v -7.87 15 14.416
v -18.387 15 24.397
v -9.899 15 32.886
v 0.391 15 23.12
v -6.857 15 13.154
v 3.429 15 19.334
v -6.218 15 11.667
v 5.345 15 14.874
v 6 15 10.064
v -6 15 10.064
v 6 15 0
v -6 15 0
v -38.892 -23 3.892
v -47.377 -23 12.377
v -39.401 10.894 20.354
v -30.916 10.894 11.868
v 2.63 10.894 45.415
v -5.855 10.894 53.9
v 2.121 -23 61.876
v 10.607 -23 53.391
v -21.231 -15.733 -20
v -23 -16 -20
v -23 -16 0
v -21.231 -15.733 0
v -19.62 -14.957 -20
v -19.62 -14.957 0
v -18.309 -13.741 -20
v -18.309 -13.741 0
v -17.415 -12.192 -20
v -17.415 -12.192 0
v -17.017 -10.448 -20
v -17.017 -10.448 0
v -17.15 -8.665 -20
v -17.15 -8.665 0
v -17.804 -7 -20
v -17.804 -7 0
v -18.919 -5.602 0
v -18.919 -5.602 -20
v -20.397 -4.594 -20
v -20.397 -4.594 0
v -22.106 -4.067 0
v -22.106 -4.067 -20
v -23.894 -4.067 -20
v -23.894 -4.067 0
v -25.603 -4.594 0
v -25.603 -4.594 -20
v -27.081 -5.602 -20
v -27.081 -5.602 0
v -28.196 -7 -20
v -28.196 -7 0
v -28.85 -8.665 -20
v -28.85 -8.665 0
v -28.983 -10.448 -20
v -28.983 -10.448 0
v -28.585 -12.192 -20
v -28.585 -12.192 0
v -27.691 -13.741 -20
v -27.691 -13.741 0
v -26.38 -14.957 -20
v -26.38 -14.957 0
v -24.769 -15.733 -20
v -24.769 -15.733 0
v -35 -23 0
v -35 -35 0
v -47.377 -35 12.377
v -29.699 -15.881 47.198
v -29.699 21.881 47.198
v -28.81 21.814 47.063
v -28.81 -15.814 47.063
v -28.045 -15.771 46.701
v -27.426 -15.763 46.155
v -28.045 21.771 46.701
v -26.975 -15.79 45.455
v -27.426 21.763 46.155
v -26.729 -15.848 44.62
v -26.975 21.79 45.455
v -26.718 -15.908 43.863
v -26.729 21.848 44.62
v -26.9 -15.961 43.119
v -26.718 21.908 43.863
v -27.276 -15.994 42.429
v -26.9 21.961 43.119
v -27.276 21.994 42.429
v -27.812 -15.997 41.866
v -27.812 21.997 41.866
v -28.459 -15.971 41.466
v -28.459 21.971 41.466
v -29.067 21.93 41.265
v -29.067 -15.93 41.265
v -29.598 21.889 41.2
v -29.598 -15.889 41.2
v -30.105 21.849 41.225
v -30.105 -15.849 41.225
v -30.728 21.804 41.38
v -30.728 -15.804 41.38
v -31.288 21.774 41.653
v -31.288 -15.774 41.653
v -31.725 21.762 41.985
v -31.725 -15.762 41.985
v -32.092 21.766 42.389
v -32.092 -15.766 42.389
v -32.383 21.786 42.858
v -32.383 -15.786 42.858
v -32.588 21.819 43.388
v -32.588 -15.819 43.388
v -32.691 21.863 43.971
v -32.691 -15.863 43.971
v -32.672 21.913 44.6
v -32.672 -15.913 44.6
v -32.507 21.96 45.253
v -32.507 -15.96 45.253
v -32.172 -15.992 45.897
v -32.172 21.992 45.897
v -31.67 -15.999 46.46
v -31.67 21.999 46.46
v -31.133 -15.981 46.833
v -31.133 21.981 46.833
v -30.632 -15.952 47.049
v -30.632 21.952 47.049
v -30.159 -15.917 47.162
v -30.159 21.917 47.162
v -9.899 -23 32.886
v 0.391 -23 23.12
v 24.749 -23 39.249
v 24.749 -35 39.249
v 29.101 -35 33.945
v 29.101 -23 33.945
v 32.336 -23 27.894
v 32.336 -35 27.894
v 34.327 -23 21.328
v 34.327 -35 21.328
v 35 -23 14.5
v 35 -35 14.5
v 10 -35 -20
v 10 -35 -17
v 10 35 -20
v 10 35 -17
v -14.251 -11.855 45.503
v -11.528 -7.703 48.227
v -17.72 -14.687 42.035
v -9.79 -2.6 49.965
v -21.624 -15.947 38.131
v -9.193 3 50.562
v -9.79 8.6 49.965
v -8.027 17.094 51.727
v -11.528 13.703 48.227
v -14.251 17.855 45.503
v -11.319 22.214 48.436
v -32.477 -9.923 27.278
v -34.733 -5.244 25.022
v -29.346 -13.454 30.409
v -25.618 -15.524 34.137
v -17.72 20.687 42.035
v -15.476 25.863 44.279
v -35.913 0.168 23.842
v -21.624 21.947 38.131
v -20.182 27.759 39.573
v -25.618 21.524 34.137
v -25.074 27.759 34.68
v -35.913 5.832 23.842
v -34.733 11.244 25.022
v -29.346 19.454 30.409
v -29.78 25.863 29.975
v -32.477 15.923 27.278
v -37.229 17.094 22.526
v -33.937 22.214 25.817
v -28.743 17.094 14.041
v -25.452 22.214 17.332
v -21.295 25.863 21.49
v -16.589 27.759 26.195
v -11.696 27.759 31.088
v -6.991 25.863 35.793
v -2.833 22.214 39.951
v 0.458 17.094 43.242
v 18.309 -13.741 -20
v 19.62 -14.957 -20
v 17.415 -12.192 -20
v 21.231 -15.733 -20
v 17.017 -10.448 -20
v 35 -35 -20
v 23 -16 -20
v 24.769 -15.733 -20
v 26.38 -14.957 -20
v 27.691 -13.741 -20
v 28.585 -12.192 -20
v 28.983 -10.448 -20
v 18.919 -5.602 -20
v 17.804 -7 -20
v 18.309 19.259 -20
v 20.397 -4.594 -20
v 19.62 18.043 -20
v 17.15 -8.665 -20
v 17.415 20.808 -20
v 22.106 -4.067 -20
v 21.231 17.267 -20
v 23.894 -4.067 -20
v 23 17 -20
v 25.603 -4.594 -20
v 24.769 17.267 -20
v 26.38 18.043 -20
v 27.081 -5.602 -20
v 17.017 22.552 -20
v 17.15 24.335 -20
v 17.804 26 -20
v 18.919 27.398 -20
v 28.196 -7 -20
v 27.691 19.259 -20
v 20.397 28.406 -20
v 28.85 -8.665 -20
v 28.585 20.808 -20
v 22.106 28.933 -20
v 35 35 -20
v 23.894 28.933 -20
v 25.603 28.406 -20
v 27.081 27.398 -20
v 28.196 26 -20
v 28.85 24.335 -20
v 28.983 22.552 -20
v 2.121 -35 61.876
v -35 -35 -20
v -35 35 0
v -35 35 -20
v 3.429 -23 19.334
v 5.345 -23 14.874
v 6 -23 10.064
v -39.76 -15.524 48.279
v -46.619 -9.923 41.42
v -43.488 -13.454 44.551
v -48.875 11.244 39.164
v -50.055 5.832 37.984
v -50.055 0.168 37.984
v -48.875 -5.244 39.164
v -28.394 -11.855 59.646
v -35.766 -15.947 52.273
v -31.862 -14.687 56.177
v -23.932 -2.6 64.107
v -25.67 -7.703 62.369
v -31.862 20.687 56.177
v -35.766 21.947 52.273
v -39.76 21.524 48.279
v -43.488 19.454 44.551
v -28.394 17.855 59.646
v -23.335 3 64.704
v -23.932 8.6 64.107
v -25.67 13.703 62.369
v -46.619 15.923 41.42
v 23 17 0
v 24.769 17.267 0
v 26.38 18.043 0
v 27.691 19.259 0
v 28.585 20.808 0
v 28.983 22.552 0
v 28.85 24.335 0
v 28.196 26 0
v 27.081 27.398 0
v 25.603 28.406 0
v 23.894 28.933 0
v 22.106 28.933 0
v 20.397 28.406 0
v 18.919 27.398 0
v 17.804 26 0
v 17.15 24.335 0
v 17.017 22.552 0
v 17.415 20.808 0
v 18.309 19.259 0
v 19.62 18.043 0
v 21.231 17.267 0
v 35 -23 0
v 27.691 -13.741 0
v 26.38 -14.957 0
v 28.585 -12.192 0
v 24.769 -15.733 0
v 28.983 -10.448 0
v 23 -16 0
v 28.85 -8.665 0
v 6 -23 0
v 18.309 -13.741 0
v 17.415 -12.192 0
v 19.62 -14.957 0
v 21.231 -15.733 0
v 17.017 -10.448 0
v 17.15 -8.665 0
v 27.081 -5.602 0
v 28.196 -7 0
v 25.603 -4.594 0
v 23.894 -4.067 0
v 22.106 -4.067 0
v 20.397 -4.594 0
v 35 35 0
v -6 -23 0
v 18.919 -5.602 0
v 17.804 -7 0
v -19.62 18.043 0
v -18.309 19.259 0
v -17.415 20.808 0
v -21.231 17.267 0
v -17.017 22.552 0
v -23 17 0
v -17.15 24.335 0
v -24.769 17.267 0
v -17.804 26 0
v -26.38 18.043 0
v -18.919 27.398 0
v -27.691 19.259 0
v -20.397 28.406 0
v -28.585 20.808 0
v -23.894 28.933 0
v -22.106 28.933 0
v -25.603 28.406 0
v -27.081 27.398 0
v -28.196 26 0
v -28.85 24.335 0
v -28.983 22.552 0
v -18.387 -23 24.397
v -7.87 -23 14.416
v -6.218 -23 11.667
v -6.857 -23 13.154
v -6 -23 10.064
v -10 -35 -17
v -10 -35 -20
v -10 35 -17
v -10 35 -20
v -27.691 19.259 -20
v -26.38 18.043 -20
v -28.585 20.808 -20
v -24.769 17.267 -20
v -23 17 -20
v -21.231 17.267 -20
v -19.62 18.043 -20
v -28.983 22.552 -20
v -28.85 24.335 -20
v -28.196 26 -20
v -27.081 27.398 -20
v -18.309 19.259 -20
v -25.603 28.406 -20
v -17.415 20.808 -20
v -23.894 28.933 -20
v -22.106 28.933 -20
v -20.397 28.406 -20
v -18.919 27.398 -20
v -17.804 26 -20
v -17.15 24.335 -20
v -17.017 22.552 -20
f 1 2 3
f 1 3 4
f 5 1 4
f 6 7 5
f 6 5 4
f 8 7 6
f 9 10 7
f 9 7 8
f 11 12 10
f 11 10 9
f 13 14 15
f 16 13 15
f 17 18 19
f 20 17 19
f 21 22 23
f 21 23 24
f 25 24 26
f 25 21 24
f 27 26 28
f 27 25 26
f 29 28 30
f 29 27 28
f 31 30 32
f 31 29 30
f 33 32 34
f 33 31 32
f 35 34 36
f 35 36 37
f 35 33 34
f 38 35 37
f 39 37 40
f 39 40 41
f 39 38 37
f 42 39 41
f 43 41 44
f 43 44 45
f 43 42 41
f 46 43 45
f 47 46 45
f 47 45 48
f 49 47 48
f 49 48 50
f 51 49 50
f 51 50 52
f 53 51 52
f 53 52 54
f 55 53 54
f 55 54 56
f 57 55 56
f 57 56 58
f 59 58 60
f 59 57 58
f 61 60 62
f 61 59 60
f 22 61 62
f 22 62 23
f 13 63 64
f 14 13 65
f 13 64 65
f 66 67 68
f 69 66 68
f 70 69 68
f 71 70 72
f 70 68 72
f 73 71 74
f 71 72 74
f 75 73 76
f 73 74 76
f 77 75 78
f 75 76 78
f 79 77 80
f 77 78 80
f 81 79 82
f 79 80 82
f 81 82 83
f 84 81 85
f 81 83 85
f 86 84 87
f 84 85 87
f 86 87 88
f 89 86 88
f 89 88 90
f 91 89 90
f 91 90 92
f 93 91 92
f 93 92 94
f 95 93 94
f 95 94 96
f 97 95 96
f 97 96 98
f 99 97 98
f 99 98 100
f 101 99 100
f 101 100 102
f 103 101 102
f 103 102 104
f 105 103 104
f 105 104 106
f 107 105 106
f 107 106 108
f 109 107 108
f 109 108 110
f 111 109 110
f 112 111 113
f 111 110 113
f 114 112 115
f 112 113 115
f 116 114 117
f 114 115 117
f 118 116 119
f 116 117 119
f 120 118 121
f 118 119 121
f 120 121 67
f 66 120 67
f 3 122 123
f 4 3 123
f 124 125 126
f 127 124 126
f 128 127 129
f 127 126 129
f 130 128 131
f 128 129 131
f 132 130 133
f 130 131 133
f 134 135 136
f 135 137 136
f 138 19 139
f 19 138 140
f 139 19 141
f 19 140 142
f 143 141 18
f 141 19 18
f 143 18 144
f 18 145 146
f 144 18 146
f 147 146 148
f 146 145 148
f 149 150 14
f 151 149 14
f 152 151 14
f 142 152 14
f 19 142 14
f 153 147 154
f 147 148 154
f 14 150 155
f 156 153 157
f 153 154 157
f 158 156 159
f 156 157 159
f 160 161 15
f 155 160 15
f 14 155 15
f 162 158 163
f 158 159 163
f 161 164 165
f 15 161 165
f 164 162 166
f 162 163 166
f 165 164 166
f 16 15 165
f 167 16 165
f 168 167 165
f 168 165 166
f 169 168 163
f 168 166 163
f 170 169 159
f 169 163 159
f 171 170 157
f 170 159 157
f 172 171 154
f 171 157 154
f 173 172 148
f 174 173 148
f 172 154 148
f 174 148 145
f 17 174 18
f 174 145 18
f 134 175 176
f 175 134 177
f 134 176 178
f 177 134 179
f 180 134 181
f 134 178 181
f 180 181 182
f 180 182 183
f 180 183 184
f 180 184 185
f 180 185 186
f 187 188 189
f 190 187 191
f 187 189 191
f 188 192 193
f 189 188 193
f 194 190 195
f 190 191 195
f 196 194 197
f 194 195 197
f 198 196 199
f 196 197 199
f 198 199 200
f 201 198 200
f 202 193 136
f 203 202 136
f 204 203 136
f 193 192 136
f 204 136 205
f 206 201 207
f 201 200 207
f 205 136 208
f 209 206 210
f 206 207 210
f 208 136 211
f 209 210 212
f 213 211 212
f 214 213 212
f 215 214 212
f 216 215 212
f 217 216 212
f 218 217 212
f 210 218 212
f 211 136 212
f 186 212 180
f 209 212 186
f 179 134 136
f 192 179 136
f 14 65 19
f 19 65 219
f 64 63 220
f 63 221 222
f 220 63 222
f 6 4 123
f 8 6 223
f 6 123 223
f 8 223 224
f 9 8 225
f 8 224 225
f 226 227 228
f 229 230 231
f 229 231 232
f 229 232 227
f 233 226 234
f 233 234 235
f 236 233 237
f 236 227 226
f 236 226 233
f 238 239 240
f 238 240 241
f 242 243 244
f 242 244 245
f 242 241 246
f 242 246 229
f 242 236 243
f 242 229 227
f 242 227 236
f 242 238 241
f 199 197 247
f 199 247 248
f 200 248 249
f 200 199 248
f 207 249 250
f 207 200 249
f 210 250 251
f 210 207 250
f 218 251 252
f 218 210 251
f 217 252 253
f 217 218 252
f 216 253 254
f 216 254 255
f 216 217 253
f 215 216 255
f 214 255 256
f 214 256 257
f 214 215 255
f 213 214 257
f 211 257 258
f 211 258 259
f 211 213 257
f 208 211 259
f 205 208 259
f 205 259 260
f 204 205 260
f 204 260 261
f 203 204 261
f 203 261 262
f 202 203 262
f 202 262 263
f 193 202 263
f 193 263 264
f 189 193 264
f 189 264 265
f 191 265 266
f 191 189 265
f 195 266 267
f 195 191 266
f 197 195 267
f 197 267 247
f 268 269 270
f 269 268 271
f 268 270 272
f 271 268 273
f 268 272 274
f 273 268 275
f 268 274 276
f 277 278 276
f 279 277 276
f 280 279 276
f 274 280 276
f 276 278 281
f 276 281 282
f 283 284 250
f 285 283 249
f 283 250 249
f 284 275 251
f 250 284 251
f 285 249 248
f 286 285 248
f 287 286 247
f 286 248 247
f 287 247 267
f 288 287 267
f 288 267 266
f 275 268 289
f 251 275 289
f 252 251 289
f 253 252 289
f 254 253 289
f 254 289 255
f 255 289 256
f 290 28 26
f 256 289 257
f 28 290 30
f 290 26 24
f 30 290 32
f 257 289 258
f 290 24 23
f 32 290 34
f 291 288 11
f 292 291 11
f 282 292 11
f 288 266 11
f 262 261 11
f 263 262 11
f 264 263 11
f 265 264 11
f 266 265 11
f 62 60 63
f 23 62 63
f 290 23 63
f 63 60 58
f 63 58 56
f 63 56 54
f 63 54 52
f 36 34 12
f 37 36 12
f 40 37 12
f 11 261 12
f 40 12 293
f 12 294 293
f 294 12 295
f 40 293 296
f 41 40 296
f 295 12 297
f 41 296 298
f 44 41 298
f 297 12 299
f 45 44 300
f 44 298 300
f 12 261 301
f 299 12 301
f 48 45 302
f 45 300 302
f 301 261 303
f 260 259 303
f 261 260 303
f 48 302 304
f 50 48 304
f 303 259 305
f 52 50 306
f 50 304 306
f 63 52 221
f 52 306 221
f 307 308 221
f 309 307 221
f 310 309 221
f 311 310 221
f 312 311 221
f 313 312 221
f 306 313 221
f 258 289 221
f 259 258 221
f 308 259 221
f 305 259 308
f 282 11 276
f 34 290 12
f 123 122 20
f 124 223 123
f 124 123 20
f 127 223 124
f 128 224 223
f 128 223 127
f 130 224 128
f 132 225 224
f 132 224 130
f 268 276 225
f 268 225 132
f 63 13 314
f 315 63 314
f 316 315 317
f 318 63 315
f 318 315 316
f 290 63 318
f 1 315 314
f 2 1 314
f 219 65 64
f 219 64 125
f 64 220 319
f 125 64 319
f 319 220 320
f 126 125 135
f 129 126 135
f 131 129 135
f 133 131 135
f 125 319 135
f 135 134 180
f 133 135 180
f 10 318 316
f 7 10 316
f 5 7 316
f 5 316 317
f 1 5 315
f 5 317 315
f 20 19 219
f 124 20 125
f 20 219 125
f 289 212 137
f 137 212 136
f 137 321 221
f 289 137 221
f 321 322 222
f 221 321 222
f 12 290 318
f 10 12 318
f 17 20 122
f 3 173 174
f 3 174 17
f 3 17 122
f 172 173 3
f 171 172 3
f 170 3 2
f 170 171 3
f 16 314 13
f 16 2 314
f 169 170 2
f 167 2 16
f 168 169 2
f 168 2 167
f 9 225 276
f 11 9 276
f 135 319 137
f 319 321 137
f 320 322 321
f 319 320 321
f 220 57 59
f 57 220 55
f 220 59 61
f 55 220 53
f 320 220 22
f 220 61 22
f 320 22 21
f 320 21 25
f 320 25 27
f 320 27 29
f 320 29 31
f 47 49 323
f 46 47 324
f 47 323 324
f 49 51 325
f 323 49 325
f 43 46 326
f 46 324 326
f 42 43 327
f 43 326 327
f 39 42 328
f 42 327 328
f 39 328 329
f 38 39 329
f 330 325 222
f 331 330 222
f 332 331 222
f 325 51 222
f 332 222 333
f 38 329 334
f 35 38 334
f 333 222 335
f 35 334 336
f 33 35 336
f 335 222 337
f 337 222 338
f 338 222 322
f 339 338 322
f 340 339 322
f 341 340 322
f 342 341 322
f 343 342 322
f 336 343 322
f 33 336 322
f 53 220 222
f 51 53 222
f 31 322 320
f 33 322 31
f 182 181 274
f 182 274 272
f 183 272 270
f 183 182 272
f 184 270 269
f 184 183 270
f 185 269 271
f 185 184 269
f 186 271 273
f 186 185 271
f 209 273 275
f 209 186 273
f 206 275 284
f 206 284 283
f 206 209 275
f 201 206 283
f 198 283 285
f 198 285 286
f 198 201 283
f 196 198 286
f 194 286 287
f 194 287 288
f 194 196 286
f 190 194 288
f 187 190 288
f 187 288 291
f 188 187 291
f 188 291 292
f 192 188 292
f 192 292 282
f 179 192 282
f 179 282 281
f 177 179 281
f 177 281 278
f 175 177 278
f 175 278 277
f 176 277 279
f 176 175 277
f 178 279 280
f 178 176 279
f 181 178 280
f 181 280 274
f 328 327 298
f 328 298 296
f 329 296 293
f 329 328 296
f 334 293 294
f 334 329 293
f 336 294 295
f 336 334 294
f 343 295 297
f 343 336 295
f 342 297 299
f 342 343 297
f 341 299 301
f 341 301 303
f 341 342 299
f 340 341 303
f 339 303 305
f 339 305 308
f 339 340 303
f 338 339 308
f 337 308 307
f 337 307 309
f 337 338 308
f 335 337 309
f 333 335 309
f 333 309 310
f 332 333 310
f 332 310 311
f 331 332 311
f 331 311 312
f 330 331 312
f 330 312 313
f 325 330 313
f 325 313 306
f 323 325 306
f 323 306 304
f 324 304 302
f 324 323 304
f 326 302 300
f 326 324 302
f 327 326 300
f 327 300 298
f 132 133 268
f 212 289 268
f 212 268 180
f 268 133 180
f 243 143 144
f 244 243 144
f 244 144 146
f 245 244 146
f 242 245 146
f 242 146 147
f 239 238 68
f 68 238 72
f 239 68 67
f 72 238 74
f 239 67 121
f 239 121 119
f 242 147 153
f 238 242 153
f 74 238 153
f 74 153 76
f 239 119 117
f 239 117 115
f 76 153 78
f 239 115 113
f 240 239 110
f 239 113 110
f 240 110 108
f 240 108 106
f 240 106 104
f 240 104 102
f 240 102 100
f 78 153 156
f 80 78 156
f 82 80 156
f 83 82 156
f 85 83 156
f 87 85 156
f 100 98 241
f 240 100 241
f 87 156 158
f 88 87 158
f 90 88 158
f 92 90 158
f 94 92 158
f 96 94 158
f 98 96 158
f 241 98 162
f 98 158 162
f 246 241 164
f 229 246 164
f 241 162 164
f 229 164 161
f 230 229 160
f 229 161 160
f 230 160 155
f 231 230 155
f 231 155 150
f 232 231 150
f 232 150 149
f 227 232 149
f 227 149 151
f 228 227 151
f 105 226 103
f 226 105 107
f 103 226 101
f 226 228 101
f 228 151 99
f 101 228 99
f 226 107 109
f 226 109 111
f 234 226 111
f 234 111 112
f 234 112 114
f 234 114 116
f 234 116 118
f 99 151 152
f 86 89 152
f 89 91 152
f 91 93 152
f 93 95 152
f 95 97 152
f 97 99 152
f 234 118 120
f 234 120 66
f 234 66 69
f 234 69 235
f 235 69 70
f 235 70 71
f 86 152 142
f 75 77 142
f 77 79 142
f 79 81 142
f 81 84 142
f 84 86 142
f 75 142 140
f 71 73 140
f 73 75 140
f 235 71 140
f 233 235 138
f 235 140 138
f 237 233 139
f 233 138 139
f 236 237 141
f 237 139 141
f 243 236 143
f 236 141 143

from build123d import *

# Parameters (mm, degrees)
BOSS_EXTRUDE1_DEPTH       = 35
BOSS_EXTRUDE2_DEPTH       = 12
BOSS_EXTRUDE3_DEPTH       = 12
SKETCH4_R                 = 19
BOSS_EXTRUDE4_DEPTH       = 20
BOSS_EXTRUDE5_DEPTH       = 38
SKETCH7_W                 = 6
SKETCH7_H                 = 100
LPATTERN1_COUNT           = 2
LPATTERN1_PITCH           = 33
LPATTERN2_COUNT           = 2
LPATTERN2_PITCH           = 46
LPATTERN2_COPY_1_SKETCH_W = 6
LPATTERN2_COPY_1_SKETCH_H = 100
SKETCH8_R                 = 3
CUT_EXTRUDE1_DEPTH        = 108.736551619


with BuildPart() as part:
    # Sketch1 → Boss-Extrude1 (new, symmetric)
    with BuildSketch(Plane(origin=(0, 0, 0), x_dir=(1, 0, 0), z_dir=(0, 1, 0))):
        Polygon((-10, 20), (-10, 17), (10, 17), (10, 20), (35, 20), (35, 0), (-35, 0), (-35, 20), align=None)
    extrude(amount=BOSS_EXTRUDE1_DEPTH, both=True)

    # Sketch2 → Boss-Extrude2 (add)
    with BuildSketch(Plane(origin=(0, -35, 0), x_dir=(-1, 0, 0), z_dir=(0, -1, 0))):
        with BuildLine():
            Line((-35, 0), (35, 0))
            Line((35, 0), (47.377416998, -12.377416998))
            Line((47.377416998, -12.377416998), (-2.121320344, -61.876154339))
            Line((-2.121320344, -61.876154339), (-24.748737342, -39.248737342))
            ThreePointArc((-24.748737342, -39.248737342), (-32.335783638, -27.893920133), (-35, -14.5))
            Line((-35, -14.5), (-35, 0))
        make_face()
    extrude(amount=-BOSS_EXTRUDE2_DEPTH)

    # Sketch3 → Boss-Extrude3 (add)
    with BuildSketch(Plane(origin=(-29.877416998, 0, 29.877416998), x_dir=(0.7071067811865468, 0, 0.7071067811865482), z_dir=(-0.7071067811865482, 0, 0.7071067811865468))):
        with BuildLine():
            Line((-24.748737342, -23), (-13.468721173, 10.894302389))
            ThreePointArc((-13.468721173, 10.894302389), (10.252155493, 28), (33.973032159, 10.894302389))
            Line((33.973032159, 10.894302389), (45.253048327, -23))
            Line((45.253048327, -23), (-24.748737342, -23))
        make_face()
    extrude(amount=-BOSS_EXTRUDE3_DEPTH)

    # Sketch4 → Boss-Extrude4 (add)
    with BuildSketch(Plane(origin=(-29.877416998, 0, 29.877416998), x_dir=(0.7071067811865468, 0, 0.7071067811865482), z_dir=(-0.7071067811865482, 0, 0.7071067811865468))):
        with Locations((10.252155493, 3)):
            Circle(SKETCH4_R)
    extrude(amount=BOSS_EXTRUDE4_DEPTH)

    # Sketch5 → Boss-Extrude5 (add)
    with BuildSketch(Plane(origin=(0, -23, 0), x_dir=(1, 0, 0), z_dir=(0, 1, 0))):
        with BuildLine():
            Line((-6, 0), (-6, -10.063607341))
            ThreePointArc((-6, -10.063607341), (-6.487174562, -12.431888509), (-7.869585231, -14.415580897))
            Line((-7.869585231, -14.415580897), (-18.386854658, -24.39741659))
            Line((-18.386854658, -24.39741659), (-9.898679248, -32.885591999))
            Line((-9.898679248, -32.885591999), (0.391244308, -23.119528009))
            ThreePointArc((0.391244308, -23.119528009), (4.538476314, -17.168450846), (6, -10.063607341))
            Line((6, -10.063607341), (6, 0))
            Line((6, 0), (-6, 0))
        make_face()
    extrude(amount=BOSS_EXTRUDE5_DEPTH)

    # Sketch7 → Hole1 (revolve, cut)
    with BuildSketch(Plane(origin=(23, -10, 0), x_dir=(0, -1, 0), z_dir=(1, 0, 0))):
        with Locations((3, 50)):
            Rectangle(SKETCH7_W, SKETCH7_H)
    hole1 = revolve(axis=Axis((23, -10, -110), (0, 0, 1)), mode=Mode.SUBTRACT)

    # LPattern1: Hole1 ×2
    with Locations(*[(0, i * LPATTERN1_PITCH, 0) for i in range(1, LPATTERN1_COUNT)]):
        add(hole1, mode=Mode.SUBTRACT)

    # LPattern2: Hole1 ×2
    with Locations(*[(-i * LPATTERN2_PITCH, 0, 0) for i in range(1, LPATTERN2_COUNT)]):
        add(hole1, mode=Mode.SUBTRACT)

    # LPattern2 copy 1 sketch → LPattern2 copy 1 (revolve, cut)
    with BuildSketch(Plane(origin=(-23, 23, 0), x_dir=(0, -1, 0), z_dir=(1, 0, 0))):
        with Locations((3, 50)):
            Rectangle(LPATTERN2_COPY_1_SKETCH_W, LPATTERN2_COPY_1_SKETCH_H)
    revolve(axis=Axis((-23, 23, -110), (0, 0, 1)), mode=Mode.SUBTRACT)

    # Sketch8 → Cut-Extrude1 (cut, through all)
    with BuildSketch(Plane(origin=(0, 35, 0), x_dir=(1, 0, 0), z_dir=(0, 1, 0))):
        with Locations(Location((-29.699116139, -44.197853481, 0), (0, 0, 270))):
            Circle(SKETCH8_R)
    extrude(amount=-CUT_EXTRUDE1_DEPTH, mode=Mode.SUBTRACT)


solid = part.part
